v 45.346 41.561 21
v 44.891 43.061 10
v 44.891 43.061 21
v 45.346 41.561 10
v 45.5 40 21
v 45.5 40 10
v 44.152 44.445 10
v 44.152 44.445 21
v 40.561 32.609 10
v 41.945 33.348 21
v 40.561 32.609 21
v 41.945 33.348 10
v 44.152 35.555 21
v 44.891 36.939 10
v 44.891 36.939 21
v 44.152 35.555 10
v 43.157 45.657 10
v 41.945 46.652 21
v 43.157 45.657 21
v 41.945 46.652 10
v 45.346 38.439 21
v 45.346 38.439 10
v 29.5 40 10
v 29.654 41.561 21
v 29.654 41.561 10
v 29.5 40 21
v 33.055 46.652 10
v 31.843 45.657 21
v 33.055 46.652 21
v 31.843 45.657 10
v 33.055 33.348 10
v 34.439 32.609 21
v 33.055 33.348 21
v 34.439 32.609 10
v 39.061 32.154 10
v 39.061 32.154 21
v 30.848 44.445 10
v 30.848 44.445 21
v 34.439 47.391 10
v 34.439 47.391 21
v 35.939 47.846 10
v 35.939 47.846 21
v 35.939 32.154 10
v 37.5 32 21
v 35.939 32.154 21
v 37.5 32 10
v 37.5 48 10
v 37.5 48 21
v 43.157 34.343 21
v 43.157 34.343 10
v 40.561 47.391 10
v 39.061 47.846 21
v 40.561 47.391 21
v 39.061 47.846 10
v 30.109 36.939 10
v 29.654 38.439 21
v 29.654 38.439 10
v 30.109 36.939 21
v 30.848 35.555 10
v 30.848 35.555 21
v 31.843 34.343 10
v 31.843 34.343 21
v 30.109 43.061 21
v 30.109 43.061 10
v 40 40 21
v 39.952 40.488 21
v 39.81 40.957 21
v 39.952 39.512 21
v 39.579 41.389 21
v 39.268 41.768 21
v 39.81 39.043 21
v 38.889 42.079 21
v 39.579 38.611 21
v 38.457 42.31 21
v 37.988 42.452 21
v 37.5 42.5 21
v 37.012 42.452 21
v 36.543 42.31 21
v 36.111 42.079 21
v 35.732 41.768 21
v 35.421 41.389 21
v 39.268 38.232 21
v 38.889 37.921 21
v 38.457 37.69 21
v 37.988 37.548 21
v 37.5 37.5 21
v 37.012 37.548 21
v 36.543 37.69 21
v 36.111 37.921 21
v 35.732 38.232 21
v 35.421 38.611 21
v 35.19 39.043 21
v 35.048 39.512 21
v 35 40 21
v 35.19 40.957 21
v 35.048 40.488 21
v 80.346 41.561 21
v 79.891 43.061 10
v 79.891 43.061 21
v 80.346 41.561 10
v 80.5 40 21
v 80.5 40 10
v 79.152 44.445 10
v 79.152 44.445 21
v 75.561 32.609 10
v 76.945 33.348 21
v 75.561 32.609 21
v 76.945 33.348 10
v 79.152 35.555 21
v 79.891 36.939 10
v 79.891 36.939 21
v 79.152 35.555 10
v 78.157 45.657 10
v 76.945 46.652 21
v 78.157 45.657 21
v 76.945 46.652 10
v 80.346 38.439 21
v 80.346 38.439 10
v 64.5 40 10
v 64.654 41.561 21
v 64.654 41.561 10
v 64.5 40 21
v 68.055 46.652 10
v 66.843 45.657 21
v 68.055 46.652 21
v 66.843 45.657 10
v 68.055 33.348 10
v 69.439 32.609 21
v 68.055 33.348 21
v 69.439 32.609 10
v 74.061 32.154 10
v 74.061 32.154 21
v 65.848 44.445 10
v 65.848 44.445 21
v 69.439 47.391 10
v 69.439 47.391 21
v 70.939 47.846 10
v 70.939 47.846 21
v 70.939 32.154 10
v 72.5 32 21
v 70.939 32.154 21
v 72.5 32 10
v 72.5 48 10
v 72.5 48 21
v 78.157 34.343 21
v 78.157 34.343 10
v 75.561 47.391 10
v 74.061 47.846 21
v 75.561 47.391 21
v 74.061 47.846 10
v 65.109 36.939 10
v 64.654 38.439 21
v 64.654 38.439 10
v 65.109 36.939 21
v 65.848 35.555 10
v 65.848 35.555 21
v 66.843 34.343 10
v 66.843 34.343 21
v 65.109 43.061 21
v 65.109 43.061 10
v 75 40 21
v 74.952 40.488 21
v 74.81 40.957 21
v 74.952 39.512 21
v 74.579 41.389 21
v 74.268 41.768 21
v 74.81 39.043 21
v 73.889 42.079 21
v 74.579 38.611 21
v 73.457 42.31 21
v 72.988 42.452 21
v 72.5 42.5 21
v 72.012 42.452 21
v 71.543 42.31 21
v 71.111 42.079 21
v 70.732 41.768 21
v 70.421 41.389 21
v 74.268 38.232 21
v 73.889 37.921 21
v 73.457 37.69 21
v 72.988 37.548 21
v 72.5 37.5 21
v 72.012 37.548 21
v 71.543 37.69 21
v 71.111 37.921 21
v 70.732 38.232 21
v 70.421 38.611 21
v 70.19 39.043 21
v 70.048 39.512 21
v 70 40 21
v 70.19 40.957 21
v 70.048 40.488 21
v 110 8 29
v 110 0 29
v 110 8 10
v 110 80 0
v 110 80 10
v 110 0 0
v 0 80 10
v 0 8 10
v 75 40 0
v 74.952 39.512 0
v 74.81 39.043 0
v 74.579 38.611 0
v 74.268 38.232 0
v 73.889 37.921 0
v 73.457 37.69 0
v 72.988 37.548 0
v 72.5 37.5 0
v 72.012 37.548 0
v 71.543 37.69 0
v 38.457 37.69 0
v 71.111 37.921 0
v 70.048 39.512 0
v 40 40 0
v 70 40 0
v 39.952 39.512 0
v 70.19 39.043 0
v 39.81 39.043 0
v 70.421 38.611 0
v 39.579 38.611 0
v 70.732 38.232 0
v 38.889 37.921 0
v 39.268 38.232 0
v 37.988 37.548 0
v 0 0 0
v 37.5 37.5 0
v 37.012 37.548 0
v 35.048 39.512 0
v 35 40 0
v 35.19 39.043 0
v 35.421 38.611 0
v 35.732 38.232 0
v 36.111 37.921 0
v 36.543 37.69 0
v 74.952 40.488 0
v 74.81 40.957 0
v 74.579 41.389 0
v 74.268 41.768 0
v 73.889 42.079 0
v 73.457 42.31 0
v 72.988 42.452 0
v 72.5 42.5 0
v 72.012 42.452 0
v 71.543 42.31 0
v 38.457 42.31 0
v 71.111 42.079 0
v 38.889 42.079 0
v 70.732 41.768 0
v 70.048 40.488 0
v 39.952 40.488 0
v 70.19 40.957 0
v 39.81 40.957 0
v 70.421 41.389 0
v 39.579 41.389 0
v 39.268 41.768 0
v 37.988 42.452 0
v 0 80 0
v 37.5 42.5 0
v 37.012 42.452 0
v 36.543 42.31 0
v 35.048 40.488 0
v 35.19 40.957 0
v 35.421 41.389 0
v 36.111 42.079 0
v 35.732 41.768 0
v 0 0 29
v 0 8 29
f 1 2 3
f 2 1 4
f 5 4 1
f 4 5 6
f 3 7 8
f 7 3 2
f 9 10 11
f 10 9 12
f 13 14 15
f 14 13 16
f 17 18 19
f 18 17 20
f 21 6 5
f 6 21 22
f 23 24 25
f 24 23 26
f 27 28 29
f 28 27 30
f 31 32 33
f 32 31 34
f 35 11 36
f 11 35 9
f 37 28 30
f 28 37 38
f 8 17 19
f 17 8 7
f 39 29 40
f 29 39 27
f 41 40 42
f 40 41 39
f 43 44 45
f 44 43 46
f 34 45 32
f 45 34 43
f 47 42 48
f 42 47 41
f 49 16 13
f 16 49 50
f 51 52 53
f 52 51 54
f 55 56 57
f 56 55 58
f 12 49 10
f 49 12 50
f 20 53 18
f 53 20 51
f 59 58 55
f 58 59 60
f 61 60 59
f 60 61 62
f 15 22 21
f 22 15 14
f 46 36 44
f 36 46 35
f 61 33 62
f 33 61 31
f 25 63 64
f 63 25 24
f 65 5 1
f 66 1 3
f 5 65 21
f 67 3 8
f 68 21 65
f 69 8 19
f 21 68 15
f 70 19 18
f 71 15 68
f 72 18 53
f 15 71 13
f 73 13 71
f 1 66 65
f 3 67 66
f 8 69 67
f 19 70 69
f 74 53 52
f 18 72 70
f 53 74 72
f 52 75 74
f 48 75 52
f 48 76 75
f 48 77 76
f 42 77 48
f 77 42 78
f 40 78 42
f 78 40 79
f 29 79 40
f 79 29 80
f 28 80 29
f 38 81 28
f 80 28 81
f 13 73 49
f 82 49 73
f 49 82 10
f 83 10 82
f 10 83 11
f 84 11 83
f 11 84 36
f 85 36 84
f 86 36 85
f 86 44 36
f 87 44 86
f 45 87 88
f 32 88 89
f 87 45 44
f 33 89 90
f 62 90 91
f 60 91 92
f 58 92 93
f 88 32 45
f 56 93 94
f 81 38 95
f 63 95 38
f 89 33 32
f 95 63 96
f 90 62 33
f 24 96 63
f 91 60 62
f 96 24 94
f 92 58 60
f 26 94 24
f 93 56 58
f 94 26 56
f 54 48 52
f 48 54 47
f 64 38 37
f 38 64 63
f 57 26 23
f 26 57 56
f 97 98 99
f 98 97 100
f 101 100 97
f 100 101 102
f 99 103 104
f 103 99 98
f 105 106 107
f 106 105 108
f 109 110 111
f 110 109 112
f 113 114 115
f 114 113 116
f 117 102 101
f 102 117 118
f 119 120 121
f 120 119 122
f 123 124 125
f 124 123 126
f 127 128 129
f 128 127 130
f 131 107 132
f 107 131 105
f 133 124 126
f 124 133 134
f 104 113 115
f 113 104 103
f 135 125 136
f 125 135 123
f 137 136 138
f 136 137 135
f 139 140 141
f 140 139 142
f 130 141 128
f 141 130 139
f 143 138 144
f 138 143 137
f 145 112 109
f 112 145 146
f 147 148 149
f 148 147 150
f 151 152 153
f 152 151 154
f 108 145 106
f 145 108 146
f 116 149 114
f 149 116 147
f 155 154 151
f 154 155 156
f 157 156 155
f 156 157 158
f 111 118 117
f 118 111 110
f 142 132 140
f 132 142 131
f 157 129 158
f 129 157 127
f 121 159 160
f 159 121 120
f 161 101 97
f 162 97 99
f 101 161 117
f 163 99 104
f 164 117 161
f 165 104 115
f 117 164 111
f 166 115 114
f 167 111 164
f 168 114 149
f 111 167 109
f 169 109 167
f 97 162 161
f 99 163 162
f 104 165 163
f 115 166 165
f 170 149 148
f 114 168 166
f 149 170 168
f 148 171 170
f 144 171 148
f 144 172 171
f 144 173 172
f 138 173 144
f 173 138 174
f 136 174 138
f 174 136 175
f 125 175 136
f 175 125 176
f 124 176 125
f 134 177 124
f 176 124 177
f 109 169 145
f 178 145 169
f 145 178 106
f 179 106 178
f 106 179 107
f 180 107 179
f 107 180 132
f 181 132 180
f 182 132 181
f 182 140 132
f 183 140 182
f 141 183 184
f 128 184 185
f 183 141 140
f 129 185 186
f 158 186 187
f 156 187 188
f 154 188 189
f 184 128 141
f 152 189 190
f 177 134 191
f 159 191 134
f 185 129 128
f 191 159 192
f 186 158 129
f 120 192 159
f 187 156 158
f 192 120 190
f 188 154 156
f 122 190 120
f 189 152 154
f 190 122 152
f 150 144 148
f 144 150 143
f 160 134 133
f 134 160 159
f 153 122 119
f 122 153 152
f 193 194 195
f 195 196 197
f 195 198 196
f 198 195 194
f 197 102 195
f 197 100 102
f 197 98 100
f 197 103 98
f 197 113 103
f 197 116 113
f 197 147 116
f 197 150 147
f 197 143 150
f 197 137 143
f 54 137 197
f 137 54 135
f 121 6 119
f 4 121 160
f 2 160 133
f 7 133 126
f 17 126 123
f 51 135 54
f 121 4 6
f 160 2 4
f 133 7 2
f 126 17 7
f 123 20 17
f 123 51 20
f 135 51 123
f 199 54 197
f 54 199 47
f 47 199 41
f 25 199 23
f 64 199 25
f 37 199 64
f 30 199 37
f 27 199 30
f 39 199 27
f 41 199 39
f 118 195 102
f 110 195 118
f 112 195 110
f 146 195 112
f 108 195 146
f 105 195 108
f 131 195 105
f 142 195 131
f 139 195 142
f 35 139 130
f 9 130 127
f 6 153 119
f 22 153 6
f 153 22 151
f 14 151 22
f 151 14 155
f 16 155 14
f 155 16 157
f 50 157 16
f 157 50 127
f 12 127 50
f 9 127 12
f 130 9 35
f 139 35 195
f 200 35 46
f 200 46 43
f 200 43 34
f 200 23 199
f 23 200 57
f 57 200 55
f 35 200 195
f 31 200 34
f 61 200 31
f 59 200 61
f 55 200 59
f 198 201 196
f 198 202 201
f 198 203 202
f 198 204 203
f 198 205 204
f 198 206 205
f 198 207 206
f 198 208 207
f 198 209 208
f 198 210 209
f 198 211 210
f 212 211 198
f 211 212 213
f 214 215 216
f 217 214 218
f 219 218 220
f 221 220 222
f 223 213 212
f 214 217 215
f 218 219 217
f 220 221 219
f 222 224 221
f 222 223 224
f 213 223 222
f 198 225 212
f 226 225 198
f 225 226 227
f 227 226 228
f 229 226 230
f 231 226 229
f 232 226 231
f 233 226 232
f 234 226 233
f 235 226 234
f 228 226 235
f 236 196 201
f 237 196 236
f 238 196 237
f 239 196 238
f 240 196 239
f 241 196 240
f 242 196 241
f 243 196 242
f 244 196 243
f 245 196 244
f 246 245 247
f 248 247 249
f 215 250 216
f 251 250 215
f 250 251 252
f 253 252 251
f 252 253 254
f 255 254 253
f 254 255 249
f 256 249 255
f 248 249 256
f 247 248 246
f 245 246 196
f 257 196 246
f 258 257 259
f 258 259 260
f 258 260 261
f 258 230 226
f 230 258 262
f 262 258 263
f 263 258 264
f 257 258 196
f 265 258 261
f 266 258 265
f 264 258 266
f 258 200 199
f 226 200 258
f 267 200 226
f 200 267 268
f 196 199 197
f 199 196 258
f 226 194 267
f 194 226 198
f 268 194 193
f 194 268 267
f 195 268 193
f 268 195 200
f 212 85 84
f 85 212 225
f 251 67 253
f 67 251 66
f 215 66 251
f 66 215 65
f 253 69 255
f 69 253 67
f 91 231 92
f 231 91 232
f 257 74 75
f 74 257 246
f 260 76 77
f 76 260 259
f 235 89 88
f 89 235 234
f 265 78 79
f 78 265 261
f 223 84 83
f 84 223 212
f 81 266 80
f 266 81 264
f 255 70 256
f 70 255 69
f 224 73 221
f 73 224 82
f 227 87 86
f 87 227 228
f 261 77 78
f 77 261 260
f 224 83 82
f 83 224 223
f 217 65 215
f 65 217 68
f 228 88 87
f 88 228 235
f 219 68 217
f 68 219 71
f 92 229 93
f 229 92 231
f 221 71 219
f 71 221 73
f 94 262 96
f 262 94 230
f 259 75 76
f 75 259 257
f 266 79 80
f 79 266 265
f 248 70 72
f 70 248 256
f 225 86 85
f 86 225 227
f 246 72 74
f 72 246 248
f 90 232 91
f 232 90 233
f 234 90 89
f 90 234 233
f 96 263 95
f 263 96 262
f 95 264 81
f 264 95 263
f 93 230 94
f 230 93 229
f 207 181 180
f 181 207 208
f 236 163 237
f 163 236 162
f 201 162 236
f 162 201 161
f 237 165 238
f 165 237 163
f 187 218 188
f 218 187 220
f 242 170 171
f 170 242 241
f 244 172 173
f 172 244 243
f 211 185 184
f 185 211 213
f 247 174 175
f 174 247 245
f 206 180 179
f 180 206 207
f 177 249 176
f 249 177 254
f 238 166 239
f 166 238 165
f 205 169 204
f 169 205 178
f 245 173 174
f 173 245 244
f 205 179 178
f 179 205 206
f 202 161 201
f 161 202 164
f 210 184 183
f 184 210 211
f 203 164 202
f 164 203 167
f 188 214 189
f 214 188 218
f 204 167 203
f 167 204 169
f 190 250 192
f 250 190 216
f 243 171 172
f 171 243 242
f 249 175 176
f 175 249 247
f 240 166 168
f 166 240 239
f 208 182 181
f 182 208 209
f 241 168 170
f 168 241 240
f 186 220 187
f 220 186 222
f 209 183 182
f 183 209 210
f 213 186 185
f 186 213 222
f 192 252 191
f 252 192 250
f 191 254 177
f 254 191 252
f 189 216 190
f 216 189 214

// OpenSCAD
$fn = 32;

// ----------------------------------------------------------------------
// Drill jig: fence jig
// ----------------------------------------------------------------------

// --- parameters (mm) ---
plate_l = 110;            // plate length, X
plate_w = 80;             // plate width, Y
plate_t = 10;             // plate thickness
boss_d = 16;              // guide boss diameter
boss_h = 12;              // boss height above the plate
guide_d = 5;              // guide hole diameter
boss_pitch = 35;          // boss pitch
fence_h = 20;             // fence height above the plate
fence_t = 8;              // fence thickness

n_boss = 2;  // guide bosses
boss_x0 = (plate_l - (n_boss - 1) * boss_pitch) / 2;  // first boss X
boss_top = plate_t - 1 + boss_h;  // boss crown height
fence_top = plate_t - 1 + fence_h;  // fence crown height
total_h = max([fence_top, boss_top]);  // overall height

difference() {
  union() {
  cube([plate_l, plate_w, plate_t]);
  for (i = [0 : n_boss - 1])
    translate([boss_x0 + i * boss_pitch, plate_w / 2, plate_t - 1])
      cylinder(h = boss_h, d = boss_d);
  translate([0, 0, plate_t - 1]) cube([plate_l, fence_t, fence_h]);
  }
  for (i = [0 : n_boss - 1])
    translate([boss_x0 + i * boss_pitch, plate_w / 2, -1])
      cylinder(h = plate_t + boss_h, d = guide_d);
}
